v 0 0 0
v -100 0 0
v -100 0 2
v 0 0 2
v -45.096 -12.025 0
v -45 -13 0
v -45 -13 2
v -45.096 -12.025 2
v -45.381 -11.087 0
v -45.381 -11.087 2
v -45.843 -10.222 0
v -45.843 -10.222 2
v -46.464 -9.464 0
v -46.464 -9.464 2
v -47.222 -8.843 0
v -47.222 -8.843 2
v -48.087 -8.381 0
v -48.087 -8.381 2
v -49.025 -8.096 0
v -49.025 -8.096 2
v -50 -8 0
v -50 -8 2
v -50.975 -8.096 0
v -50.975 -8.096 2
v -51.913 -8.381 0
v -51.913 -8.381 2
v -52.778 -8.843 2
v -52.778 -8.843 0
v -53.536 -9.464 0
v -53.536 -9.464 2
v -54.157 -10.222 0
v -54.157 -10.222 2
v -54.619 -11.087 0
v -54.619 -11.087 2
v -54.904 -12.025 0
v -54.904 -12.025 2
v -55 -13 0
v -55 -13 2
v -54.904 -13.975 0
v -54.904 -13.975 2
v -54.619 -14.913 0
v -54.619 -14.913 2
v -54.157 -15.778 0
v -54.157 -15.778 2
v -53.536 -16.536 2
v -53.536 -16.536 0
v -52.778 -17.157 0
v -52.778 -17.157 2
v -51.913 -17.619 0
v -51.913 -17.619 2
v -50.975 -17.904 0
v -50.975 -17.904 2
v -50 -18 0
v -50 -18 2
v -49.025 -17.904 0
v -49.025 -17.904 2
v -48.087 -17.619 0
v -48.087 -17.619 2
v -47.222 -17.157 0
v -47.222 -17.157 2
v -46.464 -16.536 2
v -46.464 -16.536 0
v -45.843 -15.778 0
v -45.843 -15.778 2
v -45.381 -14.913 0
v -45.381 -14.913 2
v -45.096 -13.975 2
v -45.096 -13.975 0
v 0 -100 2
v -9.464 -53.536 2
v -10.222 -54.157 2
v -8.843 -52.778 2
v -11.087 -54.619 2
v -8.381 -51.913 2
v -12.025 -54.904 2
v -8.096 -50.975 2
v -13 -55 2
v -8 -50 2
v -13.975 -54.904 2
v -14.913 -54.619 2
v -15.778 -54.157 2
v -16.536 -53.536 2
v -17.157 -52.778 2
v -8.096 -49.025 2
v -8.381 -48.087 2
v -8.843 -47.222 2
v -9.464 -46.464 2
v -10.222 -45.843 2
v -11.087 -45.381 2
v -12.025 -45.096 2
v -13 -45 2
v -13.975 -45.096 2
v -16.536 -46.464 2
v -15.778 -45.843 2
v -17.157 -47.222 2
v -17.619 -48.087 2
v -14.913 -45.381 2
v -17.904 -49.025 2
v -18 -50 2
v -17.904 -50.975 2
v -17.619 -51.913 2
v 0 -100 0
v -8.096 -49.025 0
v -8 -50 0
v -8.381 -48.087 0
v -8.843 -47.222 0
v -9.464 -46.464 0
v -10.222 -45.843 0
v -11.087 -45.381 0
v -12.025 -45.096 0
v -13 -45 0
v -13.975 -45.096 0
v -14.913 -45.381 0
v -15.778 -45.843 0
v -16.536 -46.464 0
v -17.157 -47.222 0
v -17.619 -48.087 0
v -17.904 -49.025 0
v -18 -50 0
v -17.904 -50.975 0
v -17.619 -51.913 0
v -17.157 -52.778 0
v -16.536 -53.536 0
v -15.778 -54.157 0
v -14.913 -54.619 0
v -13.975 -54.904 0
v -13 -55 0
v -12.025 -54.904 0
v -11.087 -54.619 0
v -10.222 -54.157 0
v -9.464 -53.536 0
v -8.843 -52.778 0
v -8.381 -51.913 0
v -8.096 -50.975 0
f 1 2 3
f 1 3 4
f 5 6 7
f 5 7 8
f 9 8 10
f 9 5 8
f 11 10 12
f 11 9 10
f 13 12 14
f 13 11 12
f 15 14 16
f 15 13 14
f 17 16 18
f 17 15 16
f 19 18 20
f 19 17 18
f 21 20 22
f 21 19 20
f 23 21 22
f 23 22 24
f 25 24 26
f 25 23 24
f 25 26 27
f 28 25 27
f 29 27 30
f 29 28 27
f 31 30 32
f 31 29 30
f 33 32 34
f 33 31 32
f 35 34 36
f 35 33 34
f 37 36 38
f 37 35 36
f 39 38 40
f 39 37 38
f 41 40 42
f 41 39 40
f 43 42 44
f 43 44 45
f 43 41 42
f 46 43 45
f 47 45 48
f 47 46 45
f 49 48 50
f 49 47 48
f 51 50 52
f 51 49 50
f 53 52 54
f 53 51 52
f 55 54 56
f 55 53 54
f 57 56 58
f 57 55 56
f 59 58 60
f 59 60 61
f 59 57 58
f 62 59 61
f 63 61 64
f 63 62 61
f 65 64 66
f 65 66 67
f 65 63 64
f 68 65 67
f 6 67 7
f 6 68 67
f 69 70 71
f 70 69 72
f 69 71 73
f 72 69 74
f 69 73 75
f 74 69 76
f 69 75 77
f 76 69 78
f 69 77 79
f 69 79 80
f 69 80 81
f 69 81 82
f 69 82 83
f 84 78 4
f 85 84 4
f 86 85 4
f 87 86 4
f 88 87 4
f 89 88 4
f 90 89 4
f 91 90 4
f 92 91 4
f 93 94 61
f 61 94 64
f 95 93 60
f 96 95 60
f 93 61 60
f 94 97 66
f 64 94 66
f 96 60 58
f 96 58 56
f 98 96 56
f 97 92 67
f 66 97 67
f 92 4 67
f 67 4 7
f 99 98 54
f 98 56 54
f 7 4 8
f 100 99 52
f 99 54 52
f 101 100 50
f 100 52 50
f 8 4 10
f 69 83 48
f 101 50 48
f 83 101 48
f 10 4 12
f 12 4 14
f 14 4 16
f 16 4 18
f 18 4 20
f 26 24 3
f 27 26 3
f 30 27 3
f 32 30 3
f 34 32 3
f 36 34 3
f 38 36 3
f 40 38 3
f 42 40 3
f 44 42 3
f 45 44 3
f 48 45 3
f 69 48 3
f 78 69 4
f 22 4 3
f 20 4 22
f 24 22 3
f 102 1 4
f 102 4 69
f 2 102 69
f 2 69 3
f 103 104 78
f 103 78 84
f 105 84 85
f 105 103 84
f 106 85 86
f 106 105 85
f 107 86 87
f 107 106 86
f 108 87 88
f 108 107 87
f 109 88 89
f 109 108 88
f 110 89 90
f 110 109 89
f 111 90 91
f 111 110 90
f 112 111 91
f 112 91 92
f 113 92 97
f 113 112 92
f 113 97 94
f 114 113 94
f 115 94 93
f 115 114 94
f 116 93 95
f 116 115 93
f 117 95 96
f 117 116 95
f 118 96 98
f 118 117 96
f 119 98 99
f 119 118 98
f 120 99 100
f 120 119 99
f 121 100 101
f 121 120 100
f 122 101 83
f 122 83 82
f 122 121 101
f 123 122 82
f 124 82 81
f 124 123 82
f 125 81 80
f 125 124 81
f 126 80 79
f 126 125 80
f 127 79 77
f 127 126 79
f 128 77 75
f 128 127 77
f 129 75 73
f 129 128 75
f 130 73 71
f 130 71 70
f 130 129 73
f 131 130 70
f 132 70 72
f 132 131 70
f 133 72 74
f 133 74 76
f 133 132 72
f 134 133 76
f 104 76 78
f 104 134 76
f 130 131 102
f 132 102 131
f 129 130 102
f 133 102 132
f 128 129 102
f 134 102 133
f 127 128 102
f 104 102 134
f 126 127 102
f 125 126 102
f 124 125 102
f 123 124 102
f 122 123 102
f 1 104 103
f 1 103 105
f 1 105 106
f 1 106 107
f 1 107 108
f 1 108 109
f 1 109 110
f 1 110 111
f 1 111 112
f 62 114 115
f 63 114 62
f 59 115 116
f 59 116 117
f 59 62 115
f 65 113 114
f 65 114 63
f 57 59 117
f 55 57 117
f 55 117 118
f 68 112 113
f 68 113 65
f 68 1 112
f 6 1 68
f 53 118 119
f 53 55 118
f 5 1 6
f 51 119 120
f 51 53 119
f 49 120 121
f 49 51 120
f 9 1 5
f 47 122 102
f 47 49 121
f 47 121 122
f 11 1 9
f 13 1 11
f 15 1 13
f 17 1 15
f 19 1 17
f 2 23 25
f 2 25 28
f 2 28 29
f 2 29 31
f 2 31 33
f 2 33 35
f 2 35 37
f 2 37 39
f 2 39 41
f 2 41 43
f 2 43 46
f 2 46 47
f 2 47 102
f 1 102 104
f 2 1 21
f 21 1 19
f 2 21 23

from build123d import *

# Parameters (mm, degrees)
SZKIC1_R                    = 5
DODANIE_WYCI_GNI_CIE1_DEPTH = 2


with BuildPart() as part:
    # Szkic1 → Dodanie-wyciągnięcie1 (new body)
    with BuildSketch(Plane.XY):
        Polygon((0, 0), (0, -100), (-100, 0), align=None)
        with Locations((-50, -13)):
            Circle(SZKIC1_R, mode=Mode.SUBTRACT)
        with Locations((-13, -50)):
            Circle(SZKIC1_R, mode=Mode.SUBTRACT)
    extrude(amount=DODANIE_WYCI_GNI_CIE1_DEPTH)


solid = part.part
